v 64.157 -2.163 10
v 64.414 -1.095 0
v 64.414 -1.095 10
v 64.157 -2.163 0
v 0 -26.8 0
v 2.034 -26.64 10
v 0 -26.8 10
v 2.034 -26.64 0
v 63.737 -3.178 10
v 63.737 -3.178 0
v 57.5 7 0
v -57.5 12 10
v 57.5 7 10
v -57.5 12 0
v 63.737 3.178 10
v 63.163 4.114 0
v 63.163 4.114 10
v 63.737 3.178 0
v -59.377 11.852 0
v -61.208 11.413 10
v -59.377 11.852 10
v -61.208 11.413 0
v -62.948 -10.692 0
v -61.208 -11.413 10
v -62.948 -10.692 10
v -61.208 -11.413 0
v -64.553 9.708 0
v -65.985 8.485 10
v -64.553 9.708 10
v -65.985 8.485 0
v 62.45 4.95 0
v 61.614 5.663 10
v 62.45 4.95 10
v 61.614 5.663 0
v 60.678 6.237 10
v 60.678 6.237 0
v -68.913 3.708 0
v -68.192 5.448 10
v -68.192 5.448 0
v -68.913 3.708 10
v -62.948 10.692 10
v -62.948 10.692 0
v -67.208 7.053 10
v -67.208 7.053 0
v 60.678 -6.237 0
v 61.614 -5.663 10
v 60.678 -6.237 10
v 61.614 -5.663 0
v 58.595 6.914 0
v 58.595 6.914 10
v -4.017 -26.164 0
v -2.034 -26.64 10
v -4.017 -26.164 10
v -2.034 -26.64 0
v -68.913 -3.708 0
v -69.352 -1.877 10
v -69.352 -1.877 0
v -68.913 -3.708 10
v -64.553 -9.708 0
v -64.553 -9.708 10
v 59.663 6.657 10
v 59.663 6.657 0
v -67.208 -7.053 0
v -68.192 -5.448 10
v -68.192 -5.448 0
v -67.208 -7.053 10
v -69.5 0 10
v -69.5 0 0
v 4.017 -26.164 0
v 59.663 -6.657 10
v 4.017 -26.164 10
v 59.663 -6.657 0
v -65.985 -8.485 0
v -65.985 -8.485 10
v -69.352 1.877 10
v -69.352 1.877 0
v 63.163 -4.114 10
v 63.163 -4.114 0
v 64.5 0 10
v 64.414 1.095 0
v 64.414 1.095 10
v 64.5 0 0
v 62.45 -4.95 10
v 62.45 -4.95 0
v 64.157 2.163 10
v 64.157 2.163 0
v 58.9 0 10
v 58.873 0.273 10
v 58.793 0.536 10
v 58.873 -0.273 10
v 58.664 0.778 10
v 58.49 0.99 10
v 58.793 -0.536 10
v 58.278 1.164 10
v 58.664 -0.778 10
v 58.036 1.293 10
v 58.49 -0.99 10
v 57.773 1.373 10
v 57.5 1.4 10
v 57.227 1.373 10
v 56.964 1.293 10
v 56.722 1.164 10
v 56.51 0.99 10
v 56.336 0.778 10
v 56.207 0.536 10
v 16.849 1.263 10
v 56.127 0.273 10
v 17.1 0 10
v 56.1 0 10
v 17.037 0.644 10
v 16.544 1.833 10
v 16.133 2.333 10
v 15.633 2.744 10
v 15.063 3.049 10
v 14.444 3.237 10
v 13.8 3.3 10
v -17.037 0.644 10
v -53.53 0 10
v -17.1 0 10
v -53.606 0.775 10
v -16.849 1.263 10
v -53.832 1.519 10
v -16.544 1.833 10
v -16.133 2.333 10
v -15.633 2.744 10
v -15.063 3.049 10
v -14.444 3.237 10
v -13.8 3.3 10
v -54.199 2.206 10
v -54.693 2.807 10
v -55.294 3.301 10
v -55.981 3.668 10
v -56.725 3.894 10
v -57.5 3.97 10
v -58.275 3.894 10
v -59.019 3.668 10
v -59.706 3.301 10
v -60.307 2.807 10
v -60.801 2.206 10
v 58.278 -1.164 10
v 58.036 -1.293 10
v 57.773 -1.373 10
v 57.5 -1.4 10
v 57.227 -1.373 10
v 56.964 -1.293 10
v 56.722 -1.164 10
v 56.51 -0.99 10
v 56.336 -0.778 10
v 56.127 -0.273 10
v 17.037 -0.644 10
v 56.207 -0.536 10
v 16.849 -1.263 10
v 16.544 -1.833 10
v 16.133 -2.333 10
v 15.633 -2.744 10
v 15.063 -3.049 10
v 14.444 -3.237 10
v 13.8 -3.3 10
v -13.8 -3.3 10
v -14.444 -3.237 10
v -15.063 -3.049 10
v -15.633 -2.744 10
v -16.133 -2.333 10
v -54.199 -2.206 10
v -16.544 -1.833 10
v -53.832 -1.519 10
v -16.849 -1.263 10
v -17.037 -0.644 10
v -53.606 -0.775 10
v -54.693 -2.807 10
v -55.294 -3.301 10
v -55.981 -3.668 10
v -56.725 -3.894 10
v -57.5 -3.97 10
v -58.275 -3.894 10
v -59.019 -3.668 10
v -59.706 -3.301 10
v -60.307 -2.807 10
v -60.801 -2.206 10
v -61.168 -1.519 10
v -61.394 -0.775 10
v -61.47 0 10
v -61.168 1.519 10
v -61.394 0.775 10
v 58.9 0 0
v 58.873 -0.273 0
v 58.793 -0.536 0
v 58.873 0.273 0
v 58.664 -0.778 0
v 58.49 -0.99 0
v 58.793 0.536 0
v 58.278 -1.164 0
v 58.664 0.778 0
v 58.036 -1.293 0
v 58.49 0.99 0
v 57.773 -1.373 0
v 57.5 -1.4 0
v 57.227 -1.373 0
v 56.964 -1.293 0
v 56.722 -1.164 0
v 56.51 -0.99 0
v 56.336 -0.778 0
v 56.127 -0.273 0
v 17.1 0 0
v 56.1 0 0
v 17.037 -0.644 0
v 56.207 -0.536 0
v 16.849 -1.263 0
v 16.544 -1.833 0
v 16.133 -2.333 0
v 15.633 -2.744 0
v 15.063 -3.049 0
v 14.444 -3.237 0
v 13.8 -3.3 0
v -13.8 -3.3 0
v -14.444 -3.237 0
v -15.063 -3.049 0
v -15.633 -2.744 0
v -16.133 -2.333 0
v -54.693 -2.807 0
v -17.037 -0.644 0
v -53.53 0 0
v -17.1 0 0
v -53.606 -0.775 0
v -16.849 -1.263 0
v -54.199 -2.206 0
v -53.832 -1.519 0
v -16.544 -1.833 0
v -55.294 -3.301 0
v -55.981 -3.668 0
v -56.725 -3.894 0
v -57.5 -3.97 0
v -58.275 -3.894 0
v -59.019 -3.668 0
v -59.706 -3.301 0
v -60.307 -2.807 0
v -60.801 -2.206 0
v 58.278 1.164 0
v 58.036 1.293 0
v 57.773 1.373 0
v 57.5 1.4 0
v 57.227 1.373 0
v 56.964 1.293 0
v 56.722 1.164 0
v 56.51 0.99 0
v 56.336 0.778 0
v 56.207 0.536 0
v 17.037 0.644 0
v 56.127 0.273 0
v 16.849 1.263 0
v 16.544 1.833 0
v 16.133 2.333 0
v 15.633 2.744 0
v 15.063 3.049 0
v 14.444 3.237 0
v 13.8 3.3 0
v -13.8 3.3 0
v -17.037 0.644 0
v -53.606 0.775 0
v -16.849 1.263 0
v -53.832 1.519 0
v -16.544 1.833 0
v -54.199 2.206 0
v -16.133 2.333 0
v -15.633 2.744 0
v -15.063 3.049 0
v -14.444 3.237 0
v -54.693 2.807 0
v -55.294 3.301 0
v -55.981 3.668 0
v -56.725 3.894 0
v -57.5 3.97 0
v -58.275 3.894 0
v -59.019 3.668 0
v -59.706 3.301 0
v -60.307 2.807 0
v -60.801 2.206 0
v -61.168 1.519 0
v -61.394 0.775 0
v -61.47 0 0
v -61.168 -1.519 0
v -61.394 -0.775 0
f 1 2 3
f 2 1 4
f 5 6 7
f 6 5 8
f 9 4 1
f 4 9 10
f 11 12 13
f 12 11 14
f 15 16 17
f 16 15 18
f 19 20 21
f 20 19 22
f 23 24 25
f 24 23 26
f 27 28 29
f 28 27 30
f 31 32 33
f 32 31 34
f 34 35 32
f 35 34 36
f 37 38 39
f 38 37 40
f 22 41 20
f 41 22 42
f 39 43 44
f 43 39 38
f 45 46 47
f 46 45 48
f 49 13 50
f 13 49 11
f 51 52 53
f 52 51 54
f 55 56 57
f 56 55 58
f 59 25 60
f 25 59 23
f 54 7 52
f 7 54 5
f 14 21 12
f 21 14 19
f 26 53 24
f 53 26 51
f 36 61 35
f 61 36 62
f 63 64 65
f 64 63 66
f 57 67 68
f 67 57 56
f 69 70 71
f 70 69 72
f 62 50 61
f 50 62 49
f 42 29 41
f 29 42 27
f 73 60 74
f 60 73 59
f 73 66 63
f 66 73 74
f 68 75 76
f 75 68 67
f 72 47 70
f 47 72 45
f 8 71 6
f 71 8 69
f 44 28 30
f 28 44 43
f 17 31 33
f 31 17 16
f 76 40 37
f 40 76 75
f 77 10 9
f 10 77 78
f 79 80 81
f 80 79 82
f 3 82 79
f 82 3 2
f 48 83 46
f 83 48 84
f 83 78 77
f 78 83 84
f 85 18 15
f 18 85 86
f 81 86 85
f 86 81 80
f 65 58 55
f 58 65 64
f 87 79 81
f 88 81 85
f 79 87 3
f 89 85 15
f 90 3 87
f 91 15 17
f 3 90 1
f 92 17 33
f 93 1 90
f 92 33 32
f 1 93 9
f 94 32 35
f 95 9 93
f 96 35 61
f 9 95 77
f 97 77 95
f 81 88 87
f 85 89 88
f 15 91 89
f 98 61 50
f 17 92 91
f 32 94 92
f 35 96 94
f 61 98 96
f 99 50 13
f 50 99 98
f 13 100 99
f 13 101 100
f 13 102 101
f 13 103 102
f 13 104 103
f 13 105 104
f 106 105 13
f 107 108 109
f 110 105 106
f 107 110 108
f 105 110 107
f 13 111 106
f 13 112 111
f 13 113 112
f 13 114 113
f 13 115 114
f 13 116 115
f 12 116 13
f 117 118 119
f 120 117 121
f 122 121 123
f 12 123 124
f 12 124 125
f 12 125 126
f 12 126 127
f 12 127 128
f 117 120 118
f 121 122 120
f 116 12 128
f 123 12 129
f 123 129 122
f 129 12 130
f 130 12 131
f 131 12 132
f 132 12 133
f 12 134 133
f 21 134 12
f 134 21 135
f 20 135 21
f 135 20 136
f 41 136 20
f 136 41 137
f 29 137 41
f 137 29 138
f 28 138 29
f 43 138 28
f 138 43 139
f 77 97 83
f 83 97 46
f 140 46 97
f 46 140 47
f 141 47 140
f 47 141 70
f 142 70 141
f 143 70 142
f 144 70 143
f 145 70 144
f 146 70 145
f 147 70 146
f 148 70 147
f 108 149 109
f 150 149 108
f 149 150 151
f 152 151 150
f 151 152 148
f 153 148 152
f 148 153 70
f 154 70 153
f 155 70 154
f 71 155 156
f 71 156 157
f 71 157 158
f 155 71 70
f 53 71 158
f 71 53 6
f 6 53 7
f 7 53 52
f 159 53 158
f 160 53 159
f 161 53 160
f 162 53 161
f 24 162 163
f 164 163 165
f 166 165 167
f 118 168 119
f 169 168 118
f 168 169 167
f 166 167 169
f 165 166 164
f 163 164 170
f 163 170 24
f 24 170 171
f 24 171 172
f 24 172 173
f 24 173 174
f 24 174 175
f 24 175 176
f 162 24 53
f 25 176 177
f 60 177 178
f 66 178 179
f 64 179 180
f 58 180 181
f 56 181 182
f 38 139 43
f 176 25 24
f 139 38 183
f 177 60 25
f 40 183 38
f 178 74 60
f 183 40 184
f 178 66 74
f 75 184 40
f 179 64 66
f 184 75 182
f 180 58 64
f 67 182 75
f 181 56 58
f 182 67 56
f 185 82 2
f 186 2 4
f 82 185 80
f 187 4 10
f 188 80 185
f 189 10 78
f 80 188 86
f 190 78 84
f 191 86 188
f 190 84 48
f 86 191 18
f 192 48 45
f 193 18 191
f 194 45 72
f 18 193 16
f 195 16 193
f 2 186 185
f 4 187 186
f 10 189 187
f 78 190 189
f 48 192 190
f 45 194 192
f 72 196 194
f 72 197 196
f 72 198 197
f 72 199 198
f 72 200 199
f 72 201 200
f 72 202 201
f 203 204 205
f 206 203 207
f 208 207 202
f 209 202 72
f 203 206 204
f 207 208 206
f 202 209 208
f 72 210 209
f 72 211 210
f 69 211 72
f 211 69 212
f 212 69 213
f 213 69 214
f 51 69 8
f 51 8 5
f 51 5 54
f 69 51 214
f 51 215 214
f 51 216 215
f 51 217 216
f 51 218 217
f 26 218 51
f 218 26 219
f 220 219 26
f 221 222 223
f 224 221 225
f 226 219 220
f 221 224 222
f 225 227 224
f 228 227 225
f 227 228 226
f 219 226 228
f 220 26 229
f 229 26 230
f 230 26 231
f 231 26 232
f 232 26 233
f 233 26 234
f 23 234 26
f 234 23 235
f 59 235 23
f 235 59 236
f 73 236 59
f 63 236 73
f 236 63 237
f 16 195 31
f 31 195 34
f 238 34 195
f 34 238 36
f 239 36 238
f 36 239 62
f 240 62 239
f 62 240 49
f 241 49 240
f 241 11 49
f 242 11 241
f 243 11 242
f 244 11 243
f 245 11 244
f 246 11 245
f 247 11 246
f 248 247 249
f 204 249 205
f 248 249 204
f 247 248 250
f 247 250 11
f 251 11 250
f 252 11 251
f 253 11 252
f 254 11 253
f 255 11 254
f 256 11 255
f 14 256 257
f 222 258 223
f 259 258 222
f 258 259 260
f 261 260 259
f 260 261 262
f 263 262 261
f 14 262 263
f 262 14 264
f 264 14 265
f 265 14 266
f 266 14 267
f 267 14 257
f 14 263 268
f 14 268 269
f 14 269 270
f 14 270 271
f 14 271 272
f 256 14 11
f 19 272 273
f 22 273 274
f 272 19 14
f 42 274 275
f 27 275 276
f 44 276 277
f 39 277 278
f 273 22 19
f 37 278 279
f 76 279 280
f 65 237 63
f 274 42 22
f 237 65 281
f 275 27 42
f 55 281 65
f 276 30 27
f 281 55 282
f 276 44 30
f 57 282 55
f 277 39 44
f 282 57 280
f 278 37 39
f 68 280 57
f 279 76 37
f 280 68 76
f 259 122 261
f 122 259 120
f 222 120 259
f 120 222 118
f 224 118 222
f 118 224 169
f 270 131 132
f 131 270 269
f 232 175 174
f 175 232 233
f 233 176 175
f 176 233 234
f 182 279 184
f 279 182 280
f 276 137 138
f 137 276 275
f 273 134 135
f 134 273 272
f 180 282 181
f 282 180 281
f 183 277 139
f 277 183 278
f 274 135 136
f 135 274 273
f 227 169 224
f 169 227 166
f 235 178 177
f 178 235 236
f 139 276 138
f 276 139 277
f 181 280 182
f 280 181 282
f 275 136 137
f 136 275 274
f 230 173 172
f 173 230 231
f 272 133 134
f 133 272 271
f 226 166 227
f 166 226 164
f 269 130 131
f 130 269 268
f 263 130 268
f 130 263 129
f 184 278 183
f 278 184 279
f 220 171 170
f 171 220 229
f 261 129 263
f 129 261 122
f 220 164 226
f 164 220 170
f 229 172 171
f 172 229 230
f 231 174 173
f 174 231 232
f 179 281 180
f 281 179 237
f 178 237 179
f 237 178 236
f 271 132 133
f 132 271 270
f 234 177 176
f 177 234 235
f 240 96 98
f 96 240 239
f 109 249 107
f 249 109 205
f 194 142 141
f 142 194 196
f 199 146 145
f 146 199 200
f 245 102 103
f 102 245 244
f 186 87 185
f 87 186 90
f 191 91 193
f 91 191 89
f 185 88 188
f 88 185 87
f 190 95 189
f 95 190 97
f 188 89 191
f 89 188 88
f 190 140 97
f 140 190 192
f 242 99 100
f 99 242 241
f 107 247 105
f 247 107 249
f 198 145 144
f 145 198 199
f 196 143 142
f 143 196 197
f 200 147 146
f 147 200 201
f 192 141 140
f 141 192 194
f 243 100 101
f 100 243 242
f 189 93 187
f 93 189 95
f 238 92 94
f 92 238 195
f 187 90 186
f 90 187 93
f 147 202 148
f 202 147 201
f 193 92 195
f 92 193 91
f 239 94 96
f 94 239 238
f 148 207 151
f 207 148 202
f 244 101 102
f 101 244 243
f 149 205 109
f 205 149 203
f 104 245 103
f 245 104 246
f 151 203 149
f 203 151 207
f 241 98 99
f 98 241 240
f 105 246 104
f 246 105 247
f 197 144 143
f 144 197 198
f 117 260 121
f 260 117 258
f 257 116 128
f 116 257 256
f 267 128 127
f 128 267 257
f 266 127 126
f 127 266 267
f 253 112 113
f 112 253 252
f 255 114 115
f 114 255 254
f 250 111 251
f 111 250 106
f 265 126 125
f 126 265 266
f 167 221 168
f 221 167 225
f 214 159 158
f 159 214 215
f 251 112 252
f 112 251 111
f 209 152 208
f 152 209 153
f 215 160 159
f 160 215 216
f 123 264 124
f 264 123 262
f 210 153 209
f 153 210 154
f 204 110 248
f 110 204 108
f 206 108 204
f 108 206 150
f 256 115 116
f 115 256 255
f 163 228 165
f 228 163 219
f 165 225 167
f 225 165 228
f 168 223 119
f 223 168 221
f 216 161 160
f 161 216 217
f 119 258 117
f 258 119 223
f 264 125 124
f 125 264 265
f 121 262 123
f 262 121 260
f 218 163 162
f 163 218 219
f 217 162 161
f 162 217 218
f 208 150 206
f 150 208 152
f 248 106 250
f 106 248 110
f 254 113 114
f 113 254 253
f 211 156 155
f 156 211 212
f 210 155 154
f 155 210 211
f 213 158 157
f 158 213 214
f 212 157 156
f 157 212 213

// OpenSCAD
$fn = 32;

// ----------------------------------------------------------------------
// Lever: 115 mm between the bosses, 10 mm thick, smooth outline
// ----------------------------------------------------------------------

// --- parameters (mm) ---
lever_l = 115;            // distance between the boss centres
boss_a = 24;              // first boss diameter
boss_b = 14;              // second boss diameter
bore_a = 7.94;            // first bore
bore_b = 2.8;             // second bore
lever_t = 10;             // lever thickness
boss_c = 26;              // middle boss diameter
bend = 13.8;              // how far the middle boss drops
slot_w = 6.6;             // adjustment slot width

lever_profile = [[-69.5, 0], [-69.352, -1.877], [-68.913, -3.708], [-68.192, -5.448], [-67.208, -7.053], [-65.985, -8.485], [-64.553, -9.708], [-62.948, -10.692], [-61.208, -11.413], [-4.017, -26.164], [-2.034, -26.64], [0, -26.8], [2.034, -26.64], [4.017, -26.164], [59.663, -6.657], [60.678, -6.237], [61.614, -5.663], [62.45, -4.95], [63.163, -4.114], [63.737, -3.178], [64.157, -2.163], [64.414, -1.095], [64.5, 0], [64.414, 1.095], [64.157, 2.163], [63.737, 3.178], [63.163, 4.114], [62.45, 4.95], [61.614, 5.663], [60.678, 6.237], [59.663, 6.657], [58.595, 6.914], [57.5, 7], [-57.5, 12], [-59.377, 11.852], [-61.208, 11.413], [-62.948, 10.692], [-64.553, 9.708], [-65.985, 8.485], [-67.208, 7.053], [-68.192, 5.448], [-68.913, 3.708], [-69.352, 1.877]];

difference() {
  linear_extrude(height = lever_t) polygon(lever_profile);
  translate([-57.5, 0, -2.5]) cylinder(h = lever_t + 5, d = bore_a);
  translate([57.5, 0, -2.5]) cylinder(h = lever_t + 5, d = bore_b);
  /* slotted adjustment, stadium shaped */
  hull() {
    translate([-13.8, 0, -2.5]) cylinder(h = lever_t + 5, d = slot_w);
    translate([13.8, 0, -2.5]) cylinder(h = lever_t + 5, d = slot_w);
  }
}
